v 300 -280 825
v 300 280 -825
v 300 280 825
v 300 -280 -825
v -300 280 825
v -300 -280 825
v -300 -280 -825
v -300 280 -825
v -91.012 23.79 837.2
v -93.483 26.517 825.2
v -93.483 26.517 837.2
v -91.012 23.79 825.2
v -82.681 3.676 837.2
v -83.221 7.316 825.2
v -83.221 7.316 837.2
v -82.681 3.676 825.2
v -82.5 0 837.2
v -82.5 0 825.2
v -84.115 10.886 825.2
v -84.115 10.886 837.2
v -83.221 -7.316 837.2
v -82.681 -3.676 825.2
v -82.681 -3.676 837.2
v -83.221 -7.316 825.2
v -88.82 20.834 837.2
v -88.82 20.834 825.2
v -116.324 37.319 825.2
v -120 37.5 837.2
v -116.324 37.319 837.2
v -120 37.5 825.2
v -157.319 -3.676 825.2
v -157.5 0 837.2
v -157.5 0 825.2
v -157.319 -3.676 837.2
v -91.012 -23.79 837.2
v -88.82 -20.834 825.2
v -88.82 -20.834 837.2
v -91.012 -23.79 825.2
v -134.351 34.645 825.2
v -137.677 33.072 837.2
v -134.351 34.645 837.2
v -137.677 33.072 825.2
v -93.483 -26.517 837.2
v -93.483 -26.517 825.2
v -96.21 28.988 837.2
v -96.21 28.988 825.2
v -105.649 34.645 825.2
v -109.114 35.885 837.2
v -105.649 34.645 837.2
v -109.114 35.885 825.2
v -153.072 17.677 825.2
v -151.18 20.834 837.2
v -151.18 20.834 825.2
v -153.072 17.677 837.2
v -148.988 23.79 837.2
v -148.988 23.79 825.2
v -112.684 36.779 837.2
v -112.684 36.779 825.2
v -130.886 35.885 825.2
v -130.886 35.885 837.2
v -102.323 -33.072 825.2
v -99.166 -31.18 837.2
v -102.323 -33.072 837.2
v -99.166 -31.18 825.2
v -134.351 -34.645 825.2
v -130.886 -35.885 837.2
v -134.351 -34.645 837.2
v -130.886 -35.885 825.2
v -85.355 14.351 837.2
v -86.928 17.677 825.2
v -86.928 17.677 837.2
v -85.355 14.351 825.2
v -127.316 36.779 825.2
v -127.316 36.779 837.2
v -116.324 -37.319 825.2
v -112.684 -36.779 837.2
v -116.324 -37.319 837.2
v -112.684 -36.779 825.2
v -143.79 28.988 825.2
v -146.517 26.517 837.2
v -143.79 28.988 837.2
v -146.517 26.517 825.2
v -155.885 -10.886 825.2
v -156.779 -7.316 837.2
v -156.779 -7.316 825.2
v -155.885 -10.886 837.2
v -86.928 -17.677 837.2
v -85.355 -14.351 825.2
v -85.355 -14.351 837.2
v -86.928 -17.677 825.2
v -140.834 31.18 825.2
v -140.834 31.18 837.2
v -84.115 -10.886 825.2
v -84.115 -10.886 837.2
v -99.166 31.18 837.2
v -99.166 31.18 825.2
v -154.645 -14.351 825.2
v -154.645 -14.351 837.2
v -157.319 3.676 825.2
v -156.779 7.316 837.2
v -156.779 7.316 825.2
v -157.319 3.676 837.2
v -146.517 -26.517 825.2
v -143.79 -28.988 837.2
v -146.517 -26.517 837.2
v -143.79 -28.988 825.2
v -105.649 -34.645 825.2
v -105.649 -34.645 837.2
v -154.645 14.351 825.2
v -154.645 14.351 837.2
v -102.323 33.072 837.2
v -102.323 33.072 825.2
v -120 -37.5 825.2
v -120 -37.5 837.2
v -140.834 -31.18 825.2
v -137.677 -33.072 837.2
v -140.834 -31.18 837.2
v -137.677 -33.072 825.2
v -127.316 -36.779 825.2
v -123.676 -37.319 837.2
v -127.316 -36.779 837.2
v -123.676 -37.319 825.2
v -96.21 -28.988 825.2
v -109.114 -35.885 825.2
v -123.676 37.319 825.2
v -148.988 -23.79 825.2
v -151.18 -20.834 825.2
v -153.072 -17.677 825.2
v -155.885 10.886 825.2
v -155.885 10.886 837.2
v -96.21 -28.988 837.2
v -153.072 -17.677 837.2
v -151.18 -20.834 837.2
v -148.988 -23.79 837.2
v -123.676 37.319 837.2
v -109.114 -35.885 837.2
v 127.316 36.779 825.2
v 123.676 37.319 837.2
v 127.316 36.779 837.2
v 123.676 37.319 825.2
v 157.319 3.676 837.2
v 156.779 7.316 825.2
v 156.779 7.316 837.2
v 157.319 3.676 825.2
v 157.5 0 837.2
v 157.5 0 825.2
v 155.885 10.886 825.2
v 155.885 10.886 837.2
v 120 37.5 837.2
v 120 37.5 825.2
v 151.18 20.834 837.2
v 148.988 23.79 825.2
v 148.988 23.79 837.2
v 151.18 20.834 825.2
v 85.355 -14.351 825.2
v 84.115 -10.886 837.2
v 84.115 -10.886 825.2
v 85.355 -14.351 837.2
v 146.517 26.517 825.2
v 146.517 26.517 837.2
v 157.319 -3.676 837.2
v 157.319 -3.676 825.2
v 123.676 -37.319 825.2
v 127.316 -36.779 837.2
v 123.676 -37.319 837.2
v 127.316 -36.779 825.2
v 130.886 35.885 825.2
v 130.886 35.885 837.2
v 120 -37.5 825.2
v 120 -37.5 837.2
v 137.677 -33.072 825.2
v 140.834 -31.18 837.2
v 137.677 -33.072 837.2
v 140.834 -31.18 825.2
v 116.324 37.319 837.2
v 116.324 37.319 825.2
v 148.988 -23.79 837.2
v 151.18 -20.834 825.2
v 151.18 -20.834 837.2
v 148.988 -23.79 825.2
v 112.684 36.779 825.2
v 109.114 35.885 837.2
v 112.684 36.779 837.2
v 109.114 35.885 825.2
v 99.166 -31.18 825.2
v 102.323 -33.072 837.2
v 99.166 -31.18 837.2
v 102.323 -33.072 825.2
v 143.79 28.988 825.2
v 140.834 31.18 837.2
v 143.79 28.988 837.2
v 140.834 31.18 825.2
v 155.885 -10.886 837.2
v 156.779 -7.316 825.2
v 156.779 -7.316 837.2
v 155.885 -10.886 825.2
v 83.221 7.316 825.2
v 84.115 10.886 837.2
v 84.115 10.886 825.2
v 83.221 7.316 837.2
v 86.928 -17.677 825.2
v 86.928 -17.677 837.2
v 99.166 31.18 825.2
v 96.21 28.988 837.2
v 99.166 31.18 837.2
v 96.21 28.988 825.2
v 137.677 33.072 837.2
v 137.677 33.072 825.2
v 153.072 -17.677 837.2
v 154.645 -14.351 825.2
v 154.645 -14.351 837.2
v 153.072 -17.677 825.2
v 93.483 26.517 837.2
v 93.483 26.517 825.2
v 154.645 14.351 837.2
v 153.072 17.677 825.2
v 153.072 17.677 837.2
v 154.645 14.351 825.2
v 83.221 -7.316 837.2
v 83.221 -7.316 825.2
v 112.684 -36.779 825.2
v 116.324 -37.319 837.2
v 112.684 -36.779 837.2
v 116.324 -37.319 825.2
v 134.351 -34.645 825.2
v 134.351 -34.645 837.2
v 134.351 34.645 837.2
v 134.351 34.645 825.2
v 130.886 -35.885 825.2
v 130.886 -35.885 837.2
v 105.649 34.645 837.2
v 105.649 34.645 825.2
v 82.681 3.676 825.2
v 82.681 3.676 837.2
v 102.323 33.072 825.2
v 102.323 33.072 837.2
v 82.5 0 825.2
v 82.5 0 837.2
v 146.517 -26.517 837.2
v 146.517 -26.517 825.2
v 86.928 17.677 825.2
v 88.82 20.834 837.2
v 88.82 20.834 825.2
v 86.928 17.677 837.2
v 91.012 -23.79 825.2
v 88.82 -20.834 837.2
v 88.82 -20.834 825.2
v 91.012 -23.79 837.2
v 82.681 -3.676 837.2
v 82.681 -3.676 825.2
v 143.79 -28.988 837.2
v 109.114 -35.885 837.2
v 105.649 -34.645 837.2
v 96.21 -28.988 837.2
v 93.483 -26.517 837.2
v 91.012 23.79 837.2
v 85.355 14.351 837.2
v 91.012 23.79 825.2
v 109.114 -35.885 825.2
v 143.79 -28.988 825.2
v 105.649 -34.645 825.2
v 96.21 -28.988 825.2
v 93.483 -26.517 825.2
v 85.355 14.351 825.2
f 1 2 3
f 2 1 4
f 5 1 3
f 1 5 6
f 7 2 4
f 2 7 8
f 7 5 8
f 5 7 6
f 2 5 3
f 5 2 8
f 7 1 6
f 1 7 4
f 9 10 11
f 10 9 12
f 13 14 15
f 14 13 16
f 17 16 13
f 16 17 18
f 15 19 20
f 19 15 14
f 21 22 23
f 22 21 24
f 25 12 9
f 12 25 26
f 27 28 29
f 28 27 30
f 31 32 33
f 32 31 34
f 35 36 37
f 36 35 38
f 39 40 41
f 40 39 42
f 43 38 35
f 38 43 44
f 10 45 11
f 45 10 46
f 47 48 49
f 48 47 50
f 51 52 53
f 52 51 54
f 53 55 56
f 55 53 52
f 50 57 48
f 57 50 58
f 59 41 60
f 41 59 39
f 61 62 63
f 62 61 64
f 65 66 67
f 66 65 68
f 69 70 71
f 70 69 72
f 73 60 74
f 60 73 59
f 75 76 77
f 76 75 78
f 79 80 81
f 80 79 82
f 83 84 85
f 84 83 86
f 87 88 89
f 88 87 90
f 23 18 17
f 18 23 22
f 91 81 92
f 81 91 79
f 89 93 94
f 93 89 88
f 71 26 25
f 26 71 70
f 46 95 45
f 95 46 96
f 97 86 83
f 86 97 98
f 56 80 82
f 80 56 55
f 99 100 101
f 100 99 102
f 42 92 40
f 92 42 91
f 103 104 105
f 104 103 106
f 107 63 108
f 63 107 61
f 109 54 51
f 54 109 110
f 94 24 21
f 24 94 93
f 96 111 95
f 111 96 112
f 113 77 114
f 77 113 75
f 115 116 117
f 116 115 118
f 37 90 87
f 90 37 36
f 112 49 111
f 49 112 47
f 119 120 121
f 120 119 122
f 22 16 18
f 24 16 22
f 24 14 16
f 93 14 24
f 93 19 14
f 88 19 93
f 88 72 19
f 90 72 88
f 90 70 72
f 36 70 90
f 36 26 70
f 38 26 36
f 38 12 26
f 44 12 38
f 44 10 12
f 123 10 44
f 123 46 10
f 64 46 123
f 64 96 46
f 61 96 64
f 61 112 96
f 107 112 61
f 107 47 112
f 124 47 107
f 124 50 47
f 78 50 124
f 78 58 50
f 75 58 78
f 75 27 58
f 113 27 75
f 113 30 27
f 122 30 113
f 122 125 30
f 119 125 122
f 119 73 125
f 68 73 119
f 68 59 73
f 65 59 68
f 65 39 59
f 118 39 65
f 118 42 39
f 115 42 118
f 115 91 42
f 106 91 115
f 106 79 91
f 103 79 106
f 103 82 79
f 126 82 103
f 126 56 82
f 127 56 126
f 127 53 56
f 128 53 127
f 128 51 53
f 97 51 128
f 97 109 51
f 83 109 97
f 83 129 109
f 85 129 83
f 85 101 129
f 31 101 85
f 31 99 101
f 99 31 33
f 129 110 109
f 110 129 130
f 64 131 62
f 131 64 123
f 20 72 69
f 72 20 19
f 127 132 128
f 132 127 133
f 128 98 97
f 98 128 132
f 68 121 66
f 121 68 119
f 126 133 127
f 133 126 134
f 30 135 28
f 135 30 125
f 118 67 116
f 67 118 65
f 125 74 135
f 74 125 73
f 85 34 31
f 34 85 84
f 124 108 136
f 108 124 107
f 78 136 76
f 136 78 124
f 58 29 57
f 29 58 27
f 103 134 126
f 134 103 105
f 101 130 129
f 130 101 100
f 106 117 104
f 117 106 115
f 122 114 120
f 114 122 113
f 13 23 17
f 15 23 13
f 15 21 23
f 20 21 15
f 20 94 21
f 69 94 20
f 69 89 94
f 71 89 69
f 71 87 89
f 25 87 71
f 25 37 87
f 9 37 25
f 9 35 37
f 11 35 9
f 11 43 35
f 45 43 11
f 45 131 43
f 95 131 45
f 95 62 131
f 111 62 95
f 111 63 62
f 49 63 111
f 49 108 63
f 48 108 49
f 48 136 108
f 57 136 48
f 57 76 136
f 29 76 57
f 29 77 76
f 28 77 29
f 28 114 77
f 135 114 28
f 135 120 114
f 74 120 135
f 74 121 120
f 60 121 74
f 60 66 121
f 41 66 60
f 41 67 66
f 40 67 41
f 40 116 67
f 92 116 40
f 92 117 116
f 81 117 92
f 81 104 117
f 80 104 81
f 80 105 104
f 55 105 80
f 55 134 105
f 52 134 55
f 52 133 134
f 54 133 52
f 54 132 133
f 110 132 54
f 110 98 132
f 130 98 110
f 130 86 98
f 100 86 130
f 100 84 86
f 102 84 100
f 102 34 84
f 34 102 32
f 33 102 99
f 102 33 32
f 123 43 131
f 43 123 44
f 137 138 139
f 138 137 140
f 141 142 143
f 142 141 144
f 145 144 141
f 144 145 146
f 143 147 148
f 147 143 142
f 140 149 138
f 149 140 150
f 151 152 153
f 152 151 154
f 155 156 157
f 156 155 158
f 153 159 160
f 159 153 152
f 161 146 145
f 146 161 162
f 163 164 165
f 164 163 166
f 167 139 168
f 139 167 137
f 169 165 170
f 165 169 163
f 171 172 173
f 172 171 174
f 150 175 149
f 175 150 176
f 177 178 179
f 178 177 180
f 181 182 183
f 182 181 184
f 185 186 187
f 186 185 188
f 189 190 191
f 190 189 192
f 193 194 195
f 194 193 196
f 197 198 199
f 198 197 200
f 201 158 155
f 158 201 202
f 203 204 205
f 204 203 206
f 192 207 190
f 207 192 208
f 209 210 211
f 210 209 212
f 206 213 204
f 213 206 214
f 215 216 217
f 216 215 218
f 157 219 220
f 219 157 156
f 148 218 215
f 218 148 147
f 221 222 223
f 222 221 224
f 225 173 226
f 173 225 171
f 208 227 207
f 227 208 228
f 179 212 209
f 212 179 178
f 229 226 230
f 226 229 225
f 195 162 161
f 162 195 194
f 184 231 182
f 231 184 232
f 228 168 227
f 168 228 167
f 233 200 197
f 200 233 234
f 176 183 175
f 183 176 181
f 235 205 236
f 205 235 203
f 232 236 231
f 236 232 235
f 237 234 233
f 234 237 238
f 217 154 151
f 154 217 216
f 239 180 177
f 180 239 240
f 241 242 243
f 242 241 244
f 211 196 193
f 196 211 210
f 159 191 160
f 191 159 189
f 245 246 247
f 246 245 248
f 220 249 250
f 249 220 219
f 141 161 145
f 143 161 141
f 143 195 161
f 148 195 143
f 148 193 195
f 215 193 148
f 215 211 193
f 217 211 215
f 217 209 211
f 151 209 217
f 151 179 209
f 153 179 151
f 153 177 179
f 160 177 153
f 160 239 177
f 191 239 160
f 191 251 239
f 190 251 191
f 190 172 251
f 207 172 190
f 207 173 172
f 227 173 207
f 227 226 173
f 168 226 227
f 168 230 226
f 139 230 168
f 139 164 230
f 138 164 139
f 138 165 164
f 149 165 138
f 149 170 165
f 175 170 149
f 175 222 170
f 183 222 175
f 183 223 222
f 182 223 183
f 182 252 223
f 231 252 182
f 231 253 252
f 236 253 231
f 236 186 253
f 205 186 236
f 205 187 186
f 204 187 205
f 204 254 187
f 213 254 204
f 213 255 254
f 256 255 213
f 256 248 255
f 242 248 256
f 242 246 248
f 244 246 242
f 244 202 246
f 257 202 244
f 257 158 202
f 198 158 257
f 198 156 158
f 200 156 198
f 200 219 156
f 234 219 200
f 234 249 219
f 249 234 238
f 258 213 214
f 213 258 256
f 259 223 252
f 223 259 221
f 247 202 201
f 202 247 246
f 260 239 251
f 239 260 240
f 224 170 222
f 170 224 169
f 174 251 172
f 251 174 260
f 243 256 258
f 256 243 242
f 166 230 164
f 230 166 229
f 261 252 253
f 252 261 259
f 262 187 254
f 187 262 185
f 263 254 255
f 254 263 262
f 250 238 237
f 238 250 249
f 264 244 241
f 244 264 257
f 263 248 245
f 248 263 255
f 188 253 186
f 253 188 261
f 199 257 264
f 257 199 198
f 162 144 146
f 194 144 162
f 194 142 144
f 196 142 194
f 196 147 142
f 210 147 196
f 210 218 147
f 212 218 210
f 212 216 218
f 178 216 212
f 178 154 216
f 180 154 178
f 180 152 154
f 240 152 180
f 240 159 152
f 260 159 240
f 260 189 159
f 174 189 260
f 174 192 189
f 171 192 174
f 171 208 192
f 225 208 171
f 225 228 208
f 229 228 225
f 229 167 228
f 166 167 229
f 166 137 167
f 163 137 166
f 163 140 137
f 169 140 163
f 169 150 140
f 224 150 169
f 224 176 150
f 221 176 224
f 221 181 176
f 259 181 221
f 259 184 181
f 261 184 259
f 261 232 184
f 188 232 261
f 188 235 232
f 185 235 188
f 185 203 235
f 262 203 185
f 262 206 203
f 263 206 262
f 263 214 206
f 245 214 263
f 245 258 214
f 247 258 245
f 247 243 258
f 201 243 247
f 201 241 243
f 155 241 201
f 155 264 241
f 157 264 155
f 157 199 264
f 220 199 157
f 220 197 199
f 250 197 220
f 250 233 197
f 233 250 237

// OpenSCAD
// ============================================================================
// Atom Lithography Machine — Parametric OpenSCAD Module (S6.8-02)
// ============================================================================
// part_id           : S6.8-02
// parent_bom_id     : S6.8
// subsystem         : S6
// part_name         : Kapali-cevrim 3He/4He gaz isleme sistemi (GHS), turbo sirkulasyon ve soguk kapanlar
// material          : 316L
// temp_stage        : 300 K (kabin)
// vacuum_grade      : Kapali 3He/4He dongu
// tolerance         : He <=1e-10 mbar*L/s
// computed_mass_kg  : 169.85068
// envelope_mm       : 600.000 x 560.000 x 1662.200
// design_maturity   : M0_M1_DETAILED_CAD_DESIGN_ONLY
// no_lab_measurement: true
// iec61508_certified: false
// semi_s2_certified : false
// Units: millimeters (mm)
// ============================================================================

$fn = 64;

// Nominal bounding envelope parameters (mm)
bbox_x = 600.0000;
bbox_y = 560.0000;
bbox_z = 1662.2000;

// Part-specific parametric dimensions
ghs_w = 600.0;
ghs_d = 560.0;
ghs_h = 1650.0;
he3_stp_l = 20.0;

// Interface / port parameters (mm)
port_still_pumping_line_od = 75.000;
port_still_pumping_line_bore = 50.000;
port_still_pumping_line_bolts = 4;
port_condensing_return_line_od = 75.000;
port_condensing_return_line_bore = 50.000;
port_condensing_return_line_bolts = 4;

module part_S6_8_02() {
  union() {
    // Closed-loop 3He/4He GHS cabinet
    cube([600.000, 560.000, 1650.000], center=true);
    // ISO-K DN50 still pump port
    translate([-120.000, 0.000, 831.200]) cylinder(d=75.000, h=12.000, center=true);
    // ISO-K DN50 condense return port
    translate([120.000, 0.000, 831.200]) cylinder(d=75.000, h=12.000, center=true);
  }
}

// World assembly mounting transform (global machine frame, mm / deg):
// translate([-1300.000, -800.000, 825.000]) rotate([0.000, 0.000, 0.000]) part_S6_8_02();

part_S6_8_02();
